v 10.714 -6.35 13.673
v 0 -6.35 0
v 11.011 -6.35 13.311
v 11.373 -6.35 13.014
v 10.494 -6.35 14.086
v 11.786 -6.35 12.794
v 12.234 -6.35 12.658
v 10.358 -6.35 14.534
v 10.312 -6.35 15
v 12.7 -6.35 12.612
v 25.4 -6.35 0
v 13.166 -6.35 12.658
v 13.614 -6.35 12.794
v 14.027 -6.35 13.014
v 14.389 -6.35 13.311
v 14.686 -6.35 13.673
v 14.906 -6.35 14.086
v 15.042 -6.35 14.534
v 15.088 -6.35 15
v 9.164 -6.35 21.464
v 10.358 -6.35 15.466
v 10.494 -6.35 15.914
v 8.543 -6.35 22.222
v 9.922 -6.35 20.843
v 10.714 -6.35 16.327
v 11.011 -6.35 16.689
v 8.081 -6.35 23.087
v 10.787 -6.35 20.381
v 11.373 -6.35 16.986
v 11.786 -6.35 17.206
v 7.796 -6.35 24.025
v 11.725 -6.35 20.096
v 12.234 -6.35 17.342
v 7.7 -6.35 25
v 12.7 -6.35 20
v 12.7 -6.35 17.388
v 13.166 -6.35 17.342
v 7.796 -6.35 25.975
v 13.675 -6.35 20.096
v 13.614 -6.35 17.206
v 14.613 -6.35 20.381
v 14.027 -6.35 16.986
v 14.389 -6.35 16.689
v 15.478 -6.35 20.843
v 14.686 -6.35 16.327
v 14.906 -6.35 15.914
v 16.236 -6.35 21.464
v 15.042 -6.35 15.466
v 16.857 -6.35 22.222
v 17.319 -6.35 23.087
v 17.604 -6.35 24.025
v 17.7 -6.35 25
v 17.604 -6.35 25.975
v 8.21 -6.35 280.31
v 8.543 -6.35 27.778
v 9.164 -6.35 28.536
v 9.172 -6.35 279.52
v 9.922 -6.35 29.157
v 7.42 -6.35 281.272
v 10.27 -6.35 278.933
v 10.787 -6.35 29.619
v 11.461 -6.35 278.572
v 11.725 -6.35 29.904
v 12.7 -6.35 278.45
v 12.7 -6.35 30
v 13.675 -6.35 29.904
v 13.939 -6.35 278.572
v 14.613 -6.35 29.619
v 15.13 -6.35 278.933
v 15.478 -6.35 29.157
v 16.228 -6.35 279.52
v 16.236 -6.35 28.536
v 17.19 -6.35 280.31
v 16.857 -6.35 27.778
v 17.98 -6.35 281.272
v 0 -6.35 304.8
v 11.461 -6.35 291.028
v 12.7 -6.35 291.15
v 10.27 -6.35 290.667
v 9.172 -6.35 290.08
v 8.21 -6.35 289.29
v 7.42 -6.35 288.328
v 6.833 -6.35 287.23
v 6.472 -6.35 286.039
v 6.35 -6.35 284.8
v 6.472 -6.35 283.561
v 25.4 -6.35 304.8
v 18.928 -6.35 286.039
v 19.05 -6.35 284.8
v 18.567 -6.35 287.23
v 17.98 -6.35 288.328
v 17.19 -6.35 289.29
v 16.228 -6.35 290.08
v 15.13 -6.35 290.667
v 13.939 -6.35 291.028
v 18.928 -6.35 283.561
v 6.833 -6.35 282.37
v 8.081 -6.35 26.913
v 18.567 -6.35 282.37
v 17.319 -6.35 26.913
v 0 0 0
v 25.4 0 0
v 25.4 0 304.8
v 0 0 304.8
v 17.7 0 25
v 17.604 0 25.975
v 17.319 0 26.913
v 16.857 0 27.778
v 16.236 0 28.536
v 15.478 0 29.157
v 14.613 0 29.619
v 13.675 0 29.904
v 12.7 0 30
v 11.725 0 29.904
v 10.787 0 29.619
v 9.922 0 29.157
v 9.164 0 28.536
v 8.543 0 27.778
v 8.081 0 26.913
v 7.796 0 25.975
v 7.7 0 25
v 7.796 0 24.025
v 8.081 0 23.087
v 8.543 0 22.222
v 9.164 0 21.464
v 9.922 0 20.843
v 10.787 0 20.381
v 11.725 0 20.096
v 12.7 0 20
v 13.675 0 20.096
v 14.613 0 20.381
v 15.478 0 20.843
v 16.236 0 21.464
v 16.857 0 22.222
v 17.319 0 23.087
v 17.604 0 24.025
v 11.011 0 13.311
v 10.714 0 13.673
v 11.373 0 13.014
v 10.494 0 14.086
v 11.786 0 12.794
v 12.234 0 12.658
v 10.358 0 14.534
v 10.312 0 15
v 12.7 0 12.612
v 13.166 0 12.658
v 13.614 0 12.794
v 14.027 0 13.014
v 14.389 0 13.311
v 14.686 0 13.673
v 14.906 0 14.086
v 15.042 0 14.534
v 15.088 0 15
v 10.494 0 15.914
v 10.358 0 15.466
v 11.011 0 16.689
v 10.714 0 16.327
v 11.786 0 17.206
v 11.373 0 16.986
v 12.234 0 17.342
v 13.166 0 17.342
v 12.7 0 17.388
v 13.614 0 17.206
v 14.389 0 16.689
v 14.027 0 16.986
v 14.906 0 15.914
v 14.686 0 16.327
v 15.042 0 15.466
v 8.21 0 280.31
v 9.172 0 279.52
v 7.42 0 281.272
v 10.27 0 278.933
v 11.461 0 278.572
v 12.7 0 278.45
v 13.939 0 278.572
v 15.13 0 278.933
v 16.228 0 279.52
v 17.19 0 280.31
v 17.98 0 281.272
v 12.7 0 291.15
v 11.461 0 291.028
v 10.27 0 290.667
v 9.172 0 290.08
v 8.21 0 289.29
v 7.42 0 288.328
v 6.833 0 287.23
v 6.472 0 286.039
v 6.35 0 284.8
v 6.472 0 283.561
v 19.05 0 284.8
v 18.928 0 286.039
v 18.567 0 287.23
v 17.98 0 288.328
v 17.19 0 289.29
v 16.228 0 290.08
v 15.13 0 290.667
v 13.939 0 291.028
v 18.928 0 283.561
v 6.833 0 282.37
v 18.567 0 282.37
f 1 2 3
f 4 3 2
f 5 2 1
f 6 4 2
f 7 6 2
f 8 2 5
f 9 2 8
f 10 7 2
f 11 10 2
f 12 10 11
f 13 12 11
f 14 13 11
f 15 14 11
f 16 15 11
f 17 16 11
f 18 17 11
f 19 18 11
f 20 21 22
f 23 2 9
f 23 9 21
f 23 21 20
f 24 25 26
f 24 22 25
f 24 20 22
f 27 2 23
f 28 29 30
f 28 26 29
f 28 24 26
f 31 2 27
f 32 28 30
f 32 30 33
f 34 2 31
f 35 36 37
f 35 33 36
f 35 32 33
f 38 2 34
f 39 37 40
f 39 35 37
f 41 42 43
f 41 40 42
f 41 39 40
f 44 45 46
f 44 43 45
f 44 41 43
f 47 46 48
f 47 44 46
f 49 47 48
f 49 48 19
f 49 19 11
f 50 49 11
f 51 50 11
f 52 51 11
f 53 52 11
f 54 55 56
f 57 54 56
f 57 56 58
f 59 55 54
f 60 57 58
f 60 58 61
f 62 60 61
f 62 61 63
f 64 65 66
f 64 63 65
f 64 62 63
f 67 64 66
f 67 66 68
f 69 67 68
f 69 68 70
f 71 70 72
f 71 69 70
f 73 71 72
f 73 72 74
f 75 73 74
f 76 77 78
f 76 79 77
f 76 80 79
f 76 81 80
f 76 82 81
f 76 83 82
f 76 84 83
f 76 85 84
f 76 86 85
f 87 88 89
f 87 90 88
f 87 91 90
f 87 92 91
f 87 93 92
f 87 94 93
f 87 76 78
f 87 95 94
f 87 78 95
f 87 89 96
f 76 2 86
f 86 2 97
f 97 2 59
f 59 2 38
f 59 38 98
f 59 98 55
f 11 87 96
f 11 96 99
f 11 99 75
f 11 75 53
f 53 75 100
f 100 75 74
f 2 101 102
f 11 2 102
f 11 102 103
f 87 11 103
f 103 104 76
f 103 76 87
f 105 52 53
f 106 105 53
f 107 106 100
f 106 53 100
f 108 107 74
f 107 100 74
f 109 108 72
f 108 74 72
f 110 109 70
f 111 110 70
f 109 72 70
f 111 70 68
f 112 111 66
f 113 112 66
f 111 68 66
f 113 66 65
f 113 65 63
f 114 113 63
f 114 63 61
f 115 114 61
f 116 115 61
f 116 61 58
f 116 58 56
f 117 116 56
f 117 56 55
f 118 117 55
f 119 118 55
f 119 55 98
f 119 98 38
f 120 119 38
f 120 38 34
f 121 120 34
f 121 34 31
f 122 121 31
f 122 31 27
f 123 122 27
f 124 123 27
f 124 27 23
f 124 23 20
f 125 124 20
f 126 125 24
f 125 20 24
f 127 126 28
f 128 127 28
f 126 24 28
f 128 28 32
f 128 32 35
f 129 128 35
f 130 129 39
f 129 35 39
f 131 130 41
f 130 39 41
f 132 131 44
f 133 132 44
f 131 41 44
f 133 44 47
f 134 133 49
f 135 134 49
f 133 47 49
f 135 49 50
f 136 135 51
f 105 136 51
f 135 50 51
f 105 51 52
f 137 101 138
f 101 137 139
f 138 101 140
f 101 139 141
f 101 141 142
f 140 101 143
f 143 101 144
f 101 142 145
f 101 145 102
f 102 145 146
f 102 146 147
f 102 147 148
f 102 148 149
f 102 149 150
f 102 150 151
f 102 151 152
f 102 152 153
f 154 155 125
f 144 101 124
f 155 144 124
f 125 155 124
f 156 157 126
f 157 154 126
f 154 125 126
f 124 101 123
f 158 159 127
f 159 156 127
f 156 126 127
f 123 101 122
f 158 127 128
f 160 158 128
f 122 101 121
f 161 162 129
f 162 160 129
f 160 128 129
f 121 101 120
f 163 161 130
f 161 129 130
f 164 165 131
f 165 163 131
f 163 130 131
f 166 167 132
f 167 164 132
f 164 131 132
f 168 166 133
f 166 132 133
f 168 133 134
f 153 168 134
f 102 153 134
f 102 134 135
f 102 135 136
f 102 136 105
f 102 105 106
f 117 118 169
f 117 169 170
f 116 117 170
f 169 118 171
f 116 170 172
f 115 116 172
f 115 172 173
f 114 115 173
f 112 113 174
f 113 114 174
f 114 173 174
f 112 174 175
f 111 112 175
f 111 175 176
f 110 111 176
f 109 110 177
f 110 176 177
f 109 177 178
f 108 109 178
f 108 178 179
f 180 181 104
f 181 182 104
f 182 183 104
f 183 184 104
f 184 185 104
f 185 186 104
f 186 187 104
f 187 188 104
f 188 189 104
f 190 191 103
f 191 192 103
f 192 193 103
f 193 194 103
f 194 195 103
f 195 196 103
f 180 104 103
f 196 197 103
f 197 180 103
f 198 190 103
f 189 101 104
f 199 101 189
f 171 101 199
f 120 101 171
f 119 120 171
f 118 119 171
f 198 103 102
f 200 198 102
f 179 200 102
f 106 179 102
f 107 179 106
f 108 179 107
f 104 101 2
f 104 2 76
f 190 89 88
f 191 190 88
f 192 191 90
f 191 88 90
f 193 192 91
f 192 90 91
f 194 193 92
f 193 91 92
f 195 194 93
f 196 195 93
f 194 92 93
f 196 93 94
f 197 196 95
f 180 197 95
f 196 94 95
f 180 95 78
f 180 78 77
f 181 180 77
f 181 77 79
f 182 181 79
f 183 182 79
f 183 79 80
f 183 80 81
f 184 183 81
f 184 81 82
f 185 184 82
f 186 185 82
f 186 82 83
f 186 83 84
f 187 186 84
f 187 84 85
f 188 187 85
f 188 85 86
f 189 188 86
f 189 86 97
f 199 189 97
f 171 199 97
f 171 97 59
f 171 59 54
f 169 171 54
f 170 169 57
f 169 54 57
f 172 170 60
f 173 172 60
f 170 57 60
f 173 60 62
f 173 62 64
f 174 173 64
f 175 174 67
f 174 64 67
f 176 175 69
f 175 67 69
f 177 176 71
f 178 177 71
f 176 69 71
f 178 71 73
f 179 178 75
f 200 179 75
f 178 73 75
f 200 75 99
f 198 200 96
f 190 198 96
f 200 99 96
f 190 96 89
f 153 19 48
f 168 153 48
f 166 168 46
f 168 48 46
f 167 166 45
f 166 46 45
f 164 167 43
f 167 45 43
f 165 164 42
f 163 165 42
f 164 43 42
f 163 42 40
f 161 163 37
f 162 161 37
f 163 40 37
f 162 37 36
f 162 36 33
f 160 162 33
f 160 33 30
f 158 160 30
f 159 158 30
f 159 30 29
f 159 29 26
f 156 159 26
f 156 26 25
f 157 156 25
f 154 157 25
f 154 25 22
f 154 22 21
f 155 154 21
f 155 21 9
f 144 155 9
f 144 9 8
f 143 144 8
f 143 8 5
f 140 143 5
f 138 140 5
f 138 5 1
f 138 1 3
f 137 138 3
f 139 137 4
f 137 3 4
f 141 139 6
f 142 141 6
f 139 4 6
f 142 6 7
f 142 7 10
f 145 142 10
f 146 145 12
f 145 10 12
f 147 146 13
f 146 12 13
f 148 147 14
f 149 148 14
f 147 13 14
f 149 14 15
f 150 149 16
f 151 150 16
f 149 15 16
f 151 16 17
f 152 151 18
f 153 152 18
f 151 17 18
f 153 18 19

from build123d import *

# Parameters (mm, degrees)
F0_W     = 25.4
F0_H     = 304.8
F1_DEPTH = 6.35
F2_R     = 2.388
F3_DEPTH = 6.351
F4_R     = 6.35
F5_DEPTH = 6.351
F6_R     = 5
F7_DEPTH = 6.351


with BuildPart() as f1:
    # F0 (on Front) → F1 (new body)
    with BuildSketch(Plane.XZ):
        with Locations((12.7, 152.4)):
            Rectangle(F0_W, F0_H)
    extrude(amount=F1_DEPTH)

    # F2 (on face) → F3 (cut, through all)
    with BuildSketch(Plane.XZ.offset(6.35)):
        with Locations((12.7, 15)):
            Circle(F2_R)
    extrude(amount=-F3_DEPTH, mode=Mode.SUBTRACT)

    # F4 (on face) → F5 (cut, through all)
    with BuildSketch(Plane.XZ.offset(6.35)):
        with Locations((12.7, 284.8)):
            Circle(F4_R)
    extrude(amount=-F5_DEPTH, mode=Mode.SUBTRACT)

    # F6 (on face) → F7 (cut, through all)
    with BuildSketch(Plane.XZ.offset(6.35)):
        with Locations((12.7, 25)):
            Circle(F6_R)
    extrude(amount=-F7_DEPTH, mode=Mode.SUBTRACT)


solid = f1.part
